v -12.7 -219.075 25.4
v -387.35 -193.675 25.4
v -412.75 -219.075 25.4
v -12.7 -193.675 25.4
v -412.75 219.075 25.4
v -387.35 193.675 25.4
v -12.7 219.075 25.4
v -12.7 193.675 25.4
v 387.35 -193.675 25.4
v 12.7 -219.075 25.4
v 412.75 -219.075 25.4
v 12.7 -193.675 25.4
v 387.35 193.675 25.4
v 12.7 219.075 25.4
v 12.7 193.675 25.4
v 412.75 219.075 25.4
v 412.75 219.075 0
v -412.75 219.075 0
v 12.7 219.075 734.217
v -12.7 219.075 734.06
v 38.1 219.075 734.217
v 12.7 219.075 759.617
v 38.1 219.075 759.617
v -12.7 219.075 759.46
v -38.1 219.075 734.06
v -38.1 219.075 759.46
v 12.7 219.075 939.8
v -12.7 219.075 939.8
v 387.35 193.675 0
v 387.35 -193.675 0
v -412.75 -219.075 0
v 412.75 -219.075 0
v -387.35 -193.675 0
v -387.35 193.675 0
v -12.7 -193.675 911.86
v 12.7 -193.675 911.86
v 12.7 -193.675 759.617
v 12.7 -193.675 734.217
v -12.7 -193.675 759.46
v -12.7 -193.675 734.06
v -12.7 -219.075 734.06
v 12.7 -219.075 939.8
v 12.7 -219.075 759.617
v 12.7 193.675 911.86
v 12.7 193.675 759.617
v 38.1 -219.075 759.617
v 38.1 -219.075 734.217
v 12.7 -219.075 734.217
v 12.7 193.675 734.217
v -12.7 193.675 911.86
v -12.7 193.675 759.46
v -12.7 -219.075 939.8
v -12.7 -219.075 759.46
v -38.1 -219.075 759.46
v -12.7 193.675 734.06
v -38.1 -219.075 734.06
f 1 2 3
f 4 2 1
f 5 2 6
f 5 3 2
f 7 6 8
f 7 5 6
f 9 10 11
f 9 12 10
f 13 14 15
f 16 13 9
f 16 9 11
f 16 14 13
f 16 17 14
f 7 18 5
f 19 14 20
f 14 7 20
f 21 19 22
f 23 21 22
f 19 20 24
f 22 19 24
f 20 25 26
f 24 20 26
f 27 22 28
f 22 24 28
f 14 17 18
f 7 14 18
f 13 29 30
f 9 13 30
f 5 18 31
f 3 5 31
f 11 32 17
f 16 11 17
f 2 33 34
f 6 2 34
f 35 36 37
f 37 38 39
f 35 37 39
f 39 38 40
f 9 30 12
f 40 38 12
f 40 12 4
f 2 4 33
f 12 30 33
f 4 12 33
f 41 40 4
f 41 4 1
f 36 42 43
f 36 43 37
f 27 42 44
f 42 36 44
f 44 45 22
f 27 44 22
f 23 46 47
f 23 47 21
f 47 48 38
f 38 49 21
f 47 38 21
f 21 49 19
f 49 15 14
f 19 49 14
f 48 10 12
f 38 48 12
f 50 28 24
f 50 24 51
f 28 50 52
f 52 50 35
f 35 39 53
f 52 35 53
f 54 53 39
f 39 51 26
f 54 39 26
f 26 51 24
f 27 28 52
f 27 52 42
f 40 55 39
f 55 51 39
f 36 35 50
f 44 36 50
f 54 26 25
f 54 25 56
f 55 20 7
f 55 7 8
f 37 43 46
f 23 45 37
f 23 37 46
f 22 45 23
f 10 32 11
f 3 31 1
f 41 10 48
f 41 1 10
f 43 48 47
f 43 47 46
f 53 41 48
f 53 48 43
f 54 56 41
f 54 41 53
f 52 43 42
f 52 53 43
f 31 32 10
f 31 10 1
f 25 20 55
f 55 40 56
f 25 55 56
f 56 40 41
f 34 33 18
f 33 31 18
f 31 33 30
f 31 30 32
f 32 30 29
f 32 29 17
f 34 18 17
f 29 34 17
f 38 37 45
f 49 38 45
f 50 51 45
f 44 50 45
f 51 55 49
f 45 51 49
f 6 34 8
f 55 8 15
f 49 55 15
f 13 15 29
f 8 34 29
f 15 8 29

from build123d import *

# Parameters (mm, degrees)
F0_W      = 25.4
F0_H      = 25.4
F1_DEPTH  = 25.4
F0_H_2    = 387.35
F2_DEPTH  = 939.8
F4_DEPTH  = 25.4
F7_W      = 25.4
F7_H      = 25.4
F7_W_2    = 387.35
F8_DEPTH  = 25.4
F9_W      = 438.15
F9_H      = 25.4
F10_DEPTH = 25.4


# Not quite as in the source:
# - the program builds the solid bodies; features that only make, move or delete a surface that nothing else refers to are left out


with BuildPart() as f1:
    # F0 (on Top) → F1 (new body)
    with BuildSketch(Plane.XY):
        Polygon((412.75, -219.075), (412.75, 219.075), (38.1, 219.075), (38.1, 193.675), (387.35, 193.675), (387.35, -193.675), (38.1, -193.675), (38.1, -219.075), align=None)
        with Locations((25.4, 206.375)):
            Rectangle(F0_W, F0_H)
        with Locations((0, 206.375)):
            Rectangle(F0_W, F0_H)
        with Locations((25.4, -206.375)):
            Rectangle(F0_W, F0_H)
        with Locations((-25.4, 206.375)):
            Rectangle(F0_W, F0_H)
        with Locations((0, -206.375)):
            Rectangle(F0_W, F0_H)
        Polygon((-38.1, 193.675), (-38.1, 219.075), (-412.75, 219.075), (-412.75, -219.075), (-38.1, -219.075), (-38.1, -193.675), (-387.35, -193.675), (-387.35, 193.675), align=None)
        with Locations((-25.4, -206.375)):
            Rectangle(F0_W, F0_H)
    extrude(amount=F1_DEPTH)

    # F0 (on Top) → F2 (join)
    with BuildSketch(Plane.XY):
        Rectangle(F0_W, F0_H_2)
        with Locations((0, 206.375)):
            Rectangle(F0_W, F0_H)
        with Locations((0, -206.375)):
            Rectangle(F0_W, F0_H)
    extrude(amount=F2_DEPTH)

    # F3 (on face) → F4 (cut)
    with BuildSketch(Plane(origin=(-12.7, 0, 0), x_dir=(0, -1, 0), z_dir=(-1, 0, 0))):
        Polygon((-193.675, -2.54), (193.675, -2.54), (193.675, 737.5616856575), (193.675, 911.86), (-193.675, 911.86), (-193.675, 737.5616856575), align=None)
    extrude(amount=-F4_DEPTH, mode=Mode.SUBTRACT)

    # F7 (on face) → F8 (join)
    with BuildSketch(Plane(origin=(-12.7, 0, 0), x_dir=(0, -1, 0), z_dir=(-1, 0, 0))):
        with Locations((206.375, 746.76)):
            Rectangle(F7_W, F7_H)
        with Locations((0, 746.76)):
            Rectangle(F7_W_2, F7_H)
        with Locations((-206.375, 746.76)):
            Rectangle(F7_W, F7_H)
    extrude(amount=F8_DEPTH)

    # F9 (on face) → F10 (join)
    with BuildSketch(Plane.YZ.offset(12.7)):
        with Locations((0, 746.9166304588)):
            Rectangle(F9_W, F9_H)
    extrude(amount=F10_DEPTH)


solid = f1.part
